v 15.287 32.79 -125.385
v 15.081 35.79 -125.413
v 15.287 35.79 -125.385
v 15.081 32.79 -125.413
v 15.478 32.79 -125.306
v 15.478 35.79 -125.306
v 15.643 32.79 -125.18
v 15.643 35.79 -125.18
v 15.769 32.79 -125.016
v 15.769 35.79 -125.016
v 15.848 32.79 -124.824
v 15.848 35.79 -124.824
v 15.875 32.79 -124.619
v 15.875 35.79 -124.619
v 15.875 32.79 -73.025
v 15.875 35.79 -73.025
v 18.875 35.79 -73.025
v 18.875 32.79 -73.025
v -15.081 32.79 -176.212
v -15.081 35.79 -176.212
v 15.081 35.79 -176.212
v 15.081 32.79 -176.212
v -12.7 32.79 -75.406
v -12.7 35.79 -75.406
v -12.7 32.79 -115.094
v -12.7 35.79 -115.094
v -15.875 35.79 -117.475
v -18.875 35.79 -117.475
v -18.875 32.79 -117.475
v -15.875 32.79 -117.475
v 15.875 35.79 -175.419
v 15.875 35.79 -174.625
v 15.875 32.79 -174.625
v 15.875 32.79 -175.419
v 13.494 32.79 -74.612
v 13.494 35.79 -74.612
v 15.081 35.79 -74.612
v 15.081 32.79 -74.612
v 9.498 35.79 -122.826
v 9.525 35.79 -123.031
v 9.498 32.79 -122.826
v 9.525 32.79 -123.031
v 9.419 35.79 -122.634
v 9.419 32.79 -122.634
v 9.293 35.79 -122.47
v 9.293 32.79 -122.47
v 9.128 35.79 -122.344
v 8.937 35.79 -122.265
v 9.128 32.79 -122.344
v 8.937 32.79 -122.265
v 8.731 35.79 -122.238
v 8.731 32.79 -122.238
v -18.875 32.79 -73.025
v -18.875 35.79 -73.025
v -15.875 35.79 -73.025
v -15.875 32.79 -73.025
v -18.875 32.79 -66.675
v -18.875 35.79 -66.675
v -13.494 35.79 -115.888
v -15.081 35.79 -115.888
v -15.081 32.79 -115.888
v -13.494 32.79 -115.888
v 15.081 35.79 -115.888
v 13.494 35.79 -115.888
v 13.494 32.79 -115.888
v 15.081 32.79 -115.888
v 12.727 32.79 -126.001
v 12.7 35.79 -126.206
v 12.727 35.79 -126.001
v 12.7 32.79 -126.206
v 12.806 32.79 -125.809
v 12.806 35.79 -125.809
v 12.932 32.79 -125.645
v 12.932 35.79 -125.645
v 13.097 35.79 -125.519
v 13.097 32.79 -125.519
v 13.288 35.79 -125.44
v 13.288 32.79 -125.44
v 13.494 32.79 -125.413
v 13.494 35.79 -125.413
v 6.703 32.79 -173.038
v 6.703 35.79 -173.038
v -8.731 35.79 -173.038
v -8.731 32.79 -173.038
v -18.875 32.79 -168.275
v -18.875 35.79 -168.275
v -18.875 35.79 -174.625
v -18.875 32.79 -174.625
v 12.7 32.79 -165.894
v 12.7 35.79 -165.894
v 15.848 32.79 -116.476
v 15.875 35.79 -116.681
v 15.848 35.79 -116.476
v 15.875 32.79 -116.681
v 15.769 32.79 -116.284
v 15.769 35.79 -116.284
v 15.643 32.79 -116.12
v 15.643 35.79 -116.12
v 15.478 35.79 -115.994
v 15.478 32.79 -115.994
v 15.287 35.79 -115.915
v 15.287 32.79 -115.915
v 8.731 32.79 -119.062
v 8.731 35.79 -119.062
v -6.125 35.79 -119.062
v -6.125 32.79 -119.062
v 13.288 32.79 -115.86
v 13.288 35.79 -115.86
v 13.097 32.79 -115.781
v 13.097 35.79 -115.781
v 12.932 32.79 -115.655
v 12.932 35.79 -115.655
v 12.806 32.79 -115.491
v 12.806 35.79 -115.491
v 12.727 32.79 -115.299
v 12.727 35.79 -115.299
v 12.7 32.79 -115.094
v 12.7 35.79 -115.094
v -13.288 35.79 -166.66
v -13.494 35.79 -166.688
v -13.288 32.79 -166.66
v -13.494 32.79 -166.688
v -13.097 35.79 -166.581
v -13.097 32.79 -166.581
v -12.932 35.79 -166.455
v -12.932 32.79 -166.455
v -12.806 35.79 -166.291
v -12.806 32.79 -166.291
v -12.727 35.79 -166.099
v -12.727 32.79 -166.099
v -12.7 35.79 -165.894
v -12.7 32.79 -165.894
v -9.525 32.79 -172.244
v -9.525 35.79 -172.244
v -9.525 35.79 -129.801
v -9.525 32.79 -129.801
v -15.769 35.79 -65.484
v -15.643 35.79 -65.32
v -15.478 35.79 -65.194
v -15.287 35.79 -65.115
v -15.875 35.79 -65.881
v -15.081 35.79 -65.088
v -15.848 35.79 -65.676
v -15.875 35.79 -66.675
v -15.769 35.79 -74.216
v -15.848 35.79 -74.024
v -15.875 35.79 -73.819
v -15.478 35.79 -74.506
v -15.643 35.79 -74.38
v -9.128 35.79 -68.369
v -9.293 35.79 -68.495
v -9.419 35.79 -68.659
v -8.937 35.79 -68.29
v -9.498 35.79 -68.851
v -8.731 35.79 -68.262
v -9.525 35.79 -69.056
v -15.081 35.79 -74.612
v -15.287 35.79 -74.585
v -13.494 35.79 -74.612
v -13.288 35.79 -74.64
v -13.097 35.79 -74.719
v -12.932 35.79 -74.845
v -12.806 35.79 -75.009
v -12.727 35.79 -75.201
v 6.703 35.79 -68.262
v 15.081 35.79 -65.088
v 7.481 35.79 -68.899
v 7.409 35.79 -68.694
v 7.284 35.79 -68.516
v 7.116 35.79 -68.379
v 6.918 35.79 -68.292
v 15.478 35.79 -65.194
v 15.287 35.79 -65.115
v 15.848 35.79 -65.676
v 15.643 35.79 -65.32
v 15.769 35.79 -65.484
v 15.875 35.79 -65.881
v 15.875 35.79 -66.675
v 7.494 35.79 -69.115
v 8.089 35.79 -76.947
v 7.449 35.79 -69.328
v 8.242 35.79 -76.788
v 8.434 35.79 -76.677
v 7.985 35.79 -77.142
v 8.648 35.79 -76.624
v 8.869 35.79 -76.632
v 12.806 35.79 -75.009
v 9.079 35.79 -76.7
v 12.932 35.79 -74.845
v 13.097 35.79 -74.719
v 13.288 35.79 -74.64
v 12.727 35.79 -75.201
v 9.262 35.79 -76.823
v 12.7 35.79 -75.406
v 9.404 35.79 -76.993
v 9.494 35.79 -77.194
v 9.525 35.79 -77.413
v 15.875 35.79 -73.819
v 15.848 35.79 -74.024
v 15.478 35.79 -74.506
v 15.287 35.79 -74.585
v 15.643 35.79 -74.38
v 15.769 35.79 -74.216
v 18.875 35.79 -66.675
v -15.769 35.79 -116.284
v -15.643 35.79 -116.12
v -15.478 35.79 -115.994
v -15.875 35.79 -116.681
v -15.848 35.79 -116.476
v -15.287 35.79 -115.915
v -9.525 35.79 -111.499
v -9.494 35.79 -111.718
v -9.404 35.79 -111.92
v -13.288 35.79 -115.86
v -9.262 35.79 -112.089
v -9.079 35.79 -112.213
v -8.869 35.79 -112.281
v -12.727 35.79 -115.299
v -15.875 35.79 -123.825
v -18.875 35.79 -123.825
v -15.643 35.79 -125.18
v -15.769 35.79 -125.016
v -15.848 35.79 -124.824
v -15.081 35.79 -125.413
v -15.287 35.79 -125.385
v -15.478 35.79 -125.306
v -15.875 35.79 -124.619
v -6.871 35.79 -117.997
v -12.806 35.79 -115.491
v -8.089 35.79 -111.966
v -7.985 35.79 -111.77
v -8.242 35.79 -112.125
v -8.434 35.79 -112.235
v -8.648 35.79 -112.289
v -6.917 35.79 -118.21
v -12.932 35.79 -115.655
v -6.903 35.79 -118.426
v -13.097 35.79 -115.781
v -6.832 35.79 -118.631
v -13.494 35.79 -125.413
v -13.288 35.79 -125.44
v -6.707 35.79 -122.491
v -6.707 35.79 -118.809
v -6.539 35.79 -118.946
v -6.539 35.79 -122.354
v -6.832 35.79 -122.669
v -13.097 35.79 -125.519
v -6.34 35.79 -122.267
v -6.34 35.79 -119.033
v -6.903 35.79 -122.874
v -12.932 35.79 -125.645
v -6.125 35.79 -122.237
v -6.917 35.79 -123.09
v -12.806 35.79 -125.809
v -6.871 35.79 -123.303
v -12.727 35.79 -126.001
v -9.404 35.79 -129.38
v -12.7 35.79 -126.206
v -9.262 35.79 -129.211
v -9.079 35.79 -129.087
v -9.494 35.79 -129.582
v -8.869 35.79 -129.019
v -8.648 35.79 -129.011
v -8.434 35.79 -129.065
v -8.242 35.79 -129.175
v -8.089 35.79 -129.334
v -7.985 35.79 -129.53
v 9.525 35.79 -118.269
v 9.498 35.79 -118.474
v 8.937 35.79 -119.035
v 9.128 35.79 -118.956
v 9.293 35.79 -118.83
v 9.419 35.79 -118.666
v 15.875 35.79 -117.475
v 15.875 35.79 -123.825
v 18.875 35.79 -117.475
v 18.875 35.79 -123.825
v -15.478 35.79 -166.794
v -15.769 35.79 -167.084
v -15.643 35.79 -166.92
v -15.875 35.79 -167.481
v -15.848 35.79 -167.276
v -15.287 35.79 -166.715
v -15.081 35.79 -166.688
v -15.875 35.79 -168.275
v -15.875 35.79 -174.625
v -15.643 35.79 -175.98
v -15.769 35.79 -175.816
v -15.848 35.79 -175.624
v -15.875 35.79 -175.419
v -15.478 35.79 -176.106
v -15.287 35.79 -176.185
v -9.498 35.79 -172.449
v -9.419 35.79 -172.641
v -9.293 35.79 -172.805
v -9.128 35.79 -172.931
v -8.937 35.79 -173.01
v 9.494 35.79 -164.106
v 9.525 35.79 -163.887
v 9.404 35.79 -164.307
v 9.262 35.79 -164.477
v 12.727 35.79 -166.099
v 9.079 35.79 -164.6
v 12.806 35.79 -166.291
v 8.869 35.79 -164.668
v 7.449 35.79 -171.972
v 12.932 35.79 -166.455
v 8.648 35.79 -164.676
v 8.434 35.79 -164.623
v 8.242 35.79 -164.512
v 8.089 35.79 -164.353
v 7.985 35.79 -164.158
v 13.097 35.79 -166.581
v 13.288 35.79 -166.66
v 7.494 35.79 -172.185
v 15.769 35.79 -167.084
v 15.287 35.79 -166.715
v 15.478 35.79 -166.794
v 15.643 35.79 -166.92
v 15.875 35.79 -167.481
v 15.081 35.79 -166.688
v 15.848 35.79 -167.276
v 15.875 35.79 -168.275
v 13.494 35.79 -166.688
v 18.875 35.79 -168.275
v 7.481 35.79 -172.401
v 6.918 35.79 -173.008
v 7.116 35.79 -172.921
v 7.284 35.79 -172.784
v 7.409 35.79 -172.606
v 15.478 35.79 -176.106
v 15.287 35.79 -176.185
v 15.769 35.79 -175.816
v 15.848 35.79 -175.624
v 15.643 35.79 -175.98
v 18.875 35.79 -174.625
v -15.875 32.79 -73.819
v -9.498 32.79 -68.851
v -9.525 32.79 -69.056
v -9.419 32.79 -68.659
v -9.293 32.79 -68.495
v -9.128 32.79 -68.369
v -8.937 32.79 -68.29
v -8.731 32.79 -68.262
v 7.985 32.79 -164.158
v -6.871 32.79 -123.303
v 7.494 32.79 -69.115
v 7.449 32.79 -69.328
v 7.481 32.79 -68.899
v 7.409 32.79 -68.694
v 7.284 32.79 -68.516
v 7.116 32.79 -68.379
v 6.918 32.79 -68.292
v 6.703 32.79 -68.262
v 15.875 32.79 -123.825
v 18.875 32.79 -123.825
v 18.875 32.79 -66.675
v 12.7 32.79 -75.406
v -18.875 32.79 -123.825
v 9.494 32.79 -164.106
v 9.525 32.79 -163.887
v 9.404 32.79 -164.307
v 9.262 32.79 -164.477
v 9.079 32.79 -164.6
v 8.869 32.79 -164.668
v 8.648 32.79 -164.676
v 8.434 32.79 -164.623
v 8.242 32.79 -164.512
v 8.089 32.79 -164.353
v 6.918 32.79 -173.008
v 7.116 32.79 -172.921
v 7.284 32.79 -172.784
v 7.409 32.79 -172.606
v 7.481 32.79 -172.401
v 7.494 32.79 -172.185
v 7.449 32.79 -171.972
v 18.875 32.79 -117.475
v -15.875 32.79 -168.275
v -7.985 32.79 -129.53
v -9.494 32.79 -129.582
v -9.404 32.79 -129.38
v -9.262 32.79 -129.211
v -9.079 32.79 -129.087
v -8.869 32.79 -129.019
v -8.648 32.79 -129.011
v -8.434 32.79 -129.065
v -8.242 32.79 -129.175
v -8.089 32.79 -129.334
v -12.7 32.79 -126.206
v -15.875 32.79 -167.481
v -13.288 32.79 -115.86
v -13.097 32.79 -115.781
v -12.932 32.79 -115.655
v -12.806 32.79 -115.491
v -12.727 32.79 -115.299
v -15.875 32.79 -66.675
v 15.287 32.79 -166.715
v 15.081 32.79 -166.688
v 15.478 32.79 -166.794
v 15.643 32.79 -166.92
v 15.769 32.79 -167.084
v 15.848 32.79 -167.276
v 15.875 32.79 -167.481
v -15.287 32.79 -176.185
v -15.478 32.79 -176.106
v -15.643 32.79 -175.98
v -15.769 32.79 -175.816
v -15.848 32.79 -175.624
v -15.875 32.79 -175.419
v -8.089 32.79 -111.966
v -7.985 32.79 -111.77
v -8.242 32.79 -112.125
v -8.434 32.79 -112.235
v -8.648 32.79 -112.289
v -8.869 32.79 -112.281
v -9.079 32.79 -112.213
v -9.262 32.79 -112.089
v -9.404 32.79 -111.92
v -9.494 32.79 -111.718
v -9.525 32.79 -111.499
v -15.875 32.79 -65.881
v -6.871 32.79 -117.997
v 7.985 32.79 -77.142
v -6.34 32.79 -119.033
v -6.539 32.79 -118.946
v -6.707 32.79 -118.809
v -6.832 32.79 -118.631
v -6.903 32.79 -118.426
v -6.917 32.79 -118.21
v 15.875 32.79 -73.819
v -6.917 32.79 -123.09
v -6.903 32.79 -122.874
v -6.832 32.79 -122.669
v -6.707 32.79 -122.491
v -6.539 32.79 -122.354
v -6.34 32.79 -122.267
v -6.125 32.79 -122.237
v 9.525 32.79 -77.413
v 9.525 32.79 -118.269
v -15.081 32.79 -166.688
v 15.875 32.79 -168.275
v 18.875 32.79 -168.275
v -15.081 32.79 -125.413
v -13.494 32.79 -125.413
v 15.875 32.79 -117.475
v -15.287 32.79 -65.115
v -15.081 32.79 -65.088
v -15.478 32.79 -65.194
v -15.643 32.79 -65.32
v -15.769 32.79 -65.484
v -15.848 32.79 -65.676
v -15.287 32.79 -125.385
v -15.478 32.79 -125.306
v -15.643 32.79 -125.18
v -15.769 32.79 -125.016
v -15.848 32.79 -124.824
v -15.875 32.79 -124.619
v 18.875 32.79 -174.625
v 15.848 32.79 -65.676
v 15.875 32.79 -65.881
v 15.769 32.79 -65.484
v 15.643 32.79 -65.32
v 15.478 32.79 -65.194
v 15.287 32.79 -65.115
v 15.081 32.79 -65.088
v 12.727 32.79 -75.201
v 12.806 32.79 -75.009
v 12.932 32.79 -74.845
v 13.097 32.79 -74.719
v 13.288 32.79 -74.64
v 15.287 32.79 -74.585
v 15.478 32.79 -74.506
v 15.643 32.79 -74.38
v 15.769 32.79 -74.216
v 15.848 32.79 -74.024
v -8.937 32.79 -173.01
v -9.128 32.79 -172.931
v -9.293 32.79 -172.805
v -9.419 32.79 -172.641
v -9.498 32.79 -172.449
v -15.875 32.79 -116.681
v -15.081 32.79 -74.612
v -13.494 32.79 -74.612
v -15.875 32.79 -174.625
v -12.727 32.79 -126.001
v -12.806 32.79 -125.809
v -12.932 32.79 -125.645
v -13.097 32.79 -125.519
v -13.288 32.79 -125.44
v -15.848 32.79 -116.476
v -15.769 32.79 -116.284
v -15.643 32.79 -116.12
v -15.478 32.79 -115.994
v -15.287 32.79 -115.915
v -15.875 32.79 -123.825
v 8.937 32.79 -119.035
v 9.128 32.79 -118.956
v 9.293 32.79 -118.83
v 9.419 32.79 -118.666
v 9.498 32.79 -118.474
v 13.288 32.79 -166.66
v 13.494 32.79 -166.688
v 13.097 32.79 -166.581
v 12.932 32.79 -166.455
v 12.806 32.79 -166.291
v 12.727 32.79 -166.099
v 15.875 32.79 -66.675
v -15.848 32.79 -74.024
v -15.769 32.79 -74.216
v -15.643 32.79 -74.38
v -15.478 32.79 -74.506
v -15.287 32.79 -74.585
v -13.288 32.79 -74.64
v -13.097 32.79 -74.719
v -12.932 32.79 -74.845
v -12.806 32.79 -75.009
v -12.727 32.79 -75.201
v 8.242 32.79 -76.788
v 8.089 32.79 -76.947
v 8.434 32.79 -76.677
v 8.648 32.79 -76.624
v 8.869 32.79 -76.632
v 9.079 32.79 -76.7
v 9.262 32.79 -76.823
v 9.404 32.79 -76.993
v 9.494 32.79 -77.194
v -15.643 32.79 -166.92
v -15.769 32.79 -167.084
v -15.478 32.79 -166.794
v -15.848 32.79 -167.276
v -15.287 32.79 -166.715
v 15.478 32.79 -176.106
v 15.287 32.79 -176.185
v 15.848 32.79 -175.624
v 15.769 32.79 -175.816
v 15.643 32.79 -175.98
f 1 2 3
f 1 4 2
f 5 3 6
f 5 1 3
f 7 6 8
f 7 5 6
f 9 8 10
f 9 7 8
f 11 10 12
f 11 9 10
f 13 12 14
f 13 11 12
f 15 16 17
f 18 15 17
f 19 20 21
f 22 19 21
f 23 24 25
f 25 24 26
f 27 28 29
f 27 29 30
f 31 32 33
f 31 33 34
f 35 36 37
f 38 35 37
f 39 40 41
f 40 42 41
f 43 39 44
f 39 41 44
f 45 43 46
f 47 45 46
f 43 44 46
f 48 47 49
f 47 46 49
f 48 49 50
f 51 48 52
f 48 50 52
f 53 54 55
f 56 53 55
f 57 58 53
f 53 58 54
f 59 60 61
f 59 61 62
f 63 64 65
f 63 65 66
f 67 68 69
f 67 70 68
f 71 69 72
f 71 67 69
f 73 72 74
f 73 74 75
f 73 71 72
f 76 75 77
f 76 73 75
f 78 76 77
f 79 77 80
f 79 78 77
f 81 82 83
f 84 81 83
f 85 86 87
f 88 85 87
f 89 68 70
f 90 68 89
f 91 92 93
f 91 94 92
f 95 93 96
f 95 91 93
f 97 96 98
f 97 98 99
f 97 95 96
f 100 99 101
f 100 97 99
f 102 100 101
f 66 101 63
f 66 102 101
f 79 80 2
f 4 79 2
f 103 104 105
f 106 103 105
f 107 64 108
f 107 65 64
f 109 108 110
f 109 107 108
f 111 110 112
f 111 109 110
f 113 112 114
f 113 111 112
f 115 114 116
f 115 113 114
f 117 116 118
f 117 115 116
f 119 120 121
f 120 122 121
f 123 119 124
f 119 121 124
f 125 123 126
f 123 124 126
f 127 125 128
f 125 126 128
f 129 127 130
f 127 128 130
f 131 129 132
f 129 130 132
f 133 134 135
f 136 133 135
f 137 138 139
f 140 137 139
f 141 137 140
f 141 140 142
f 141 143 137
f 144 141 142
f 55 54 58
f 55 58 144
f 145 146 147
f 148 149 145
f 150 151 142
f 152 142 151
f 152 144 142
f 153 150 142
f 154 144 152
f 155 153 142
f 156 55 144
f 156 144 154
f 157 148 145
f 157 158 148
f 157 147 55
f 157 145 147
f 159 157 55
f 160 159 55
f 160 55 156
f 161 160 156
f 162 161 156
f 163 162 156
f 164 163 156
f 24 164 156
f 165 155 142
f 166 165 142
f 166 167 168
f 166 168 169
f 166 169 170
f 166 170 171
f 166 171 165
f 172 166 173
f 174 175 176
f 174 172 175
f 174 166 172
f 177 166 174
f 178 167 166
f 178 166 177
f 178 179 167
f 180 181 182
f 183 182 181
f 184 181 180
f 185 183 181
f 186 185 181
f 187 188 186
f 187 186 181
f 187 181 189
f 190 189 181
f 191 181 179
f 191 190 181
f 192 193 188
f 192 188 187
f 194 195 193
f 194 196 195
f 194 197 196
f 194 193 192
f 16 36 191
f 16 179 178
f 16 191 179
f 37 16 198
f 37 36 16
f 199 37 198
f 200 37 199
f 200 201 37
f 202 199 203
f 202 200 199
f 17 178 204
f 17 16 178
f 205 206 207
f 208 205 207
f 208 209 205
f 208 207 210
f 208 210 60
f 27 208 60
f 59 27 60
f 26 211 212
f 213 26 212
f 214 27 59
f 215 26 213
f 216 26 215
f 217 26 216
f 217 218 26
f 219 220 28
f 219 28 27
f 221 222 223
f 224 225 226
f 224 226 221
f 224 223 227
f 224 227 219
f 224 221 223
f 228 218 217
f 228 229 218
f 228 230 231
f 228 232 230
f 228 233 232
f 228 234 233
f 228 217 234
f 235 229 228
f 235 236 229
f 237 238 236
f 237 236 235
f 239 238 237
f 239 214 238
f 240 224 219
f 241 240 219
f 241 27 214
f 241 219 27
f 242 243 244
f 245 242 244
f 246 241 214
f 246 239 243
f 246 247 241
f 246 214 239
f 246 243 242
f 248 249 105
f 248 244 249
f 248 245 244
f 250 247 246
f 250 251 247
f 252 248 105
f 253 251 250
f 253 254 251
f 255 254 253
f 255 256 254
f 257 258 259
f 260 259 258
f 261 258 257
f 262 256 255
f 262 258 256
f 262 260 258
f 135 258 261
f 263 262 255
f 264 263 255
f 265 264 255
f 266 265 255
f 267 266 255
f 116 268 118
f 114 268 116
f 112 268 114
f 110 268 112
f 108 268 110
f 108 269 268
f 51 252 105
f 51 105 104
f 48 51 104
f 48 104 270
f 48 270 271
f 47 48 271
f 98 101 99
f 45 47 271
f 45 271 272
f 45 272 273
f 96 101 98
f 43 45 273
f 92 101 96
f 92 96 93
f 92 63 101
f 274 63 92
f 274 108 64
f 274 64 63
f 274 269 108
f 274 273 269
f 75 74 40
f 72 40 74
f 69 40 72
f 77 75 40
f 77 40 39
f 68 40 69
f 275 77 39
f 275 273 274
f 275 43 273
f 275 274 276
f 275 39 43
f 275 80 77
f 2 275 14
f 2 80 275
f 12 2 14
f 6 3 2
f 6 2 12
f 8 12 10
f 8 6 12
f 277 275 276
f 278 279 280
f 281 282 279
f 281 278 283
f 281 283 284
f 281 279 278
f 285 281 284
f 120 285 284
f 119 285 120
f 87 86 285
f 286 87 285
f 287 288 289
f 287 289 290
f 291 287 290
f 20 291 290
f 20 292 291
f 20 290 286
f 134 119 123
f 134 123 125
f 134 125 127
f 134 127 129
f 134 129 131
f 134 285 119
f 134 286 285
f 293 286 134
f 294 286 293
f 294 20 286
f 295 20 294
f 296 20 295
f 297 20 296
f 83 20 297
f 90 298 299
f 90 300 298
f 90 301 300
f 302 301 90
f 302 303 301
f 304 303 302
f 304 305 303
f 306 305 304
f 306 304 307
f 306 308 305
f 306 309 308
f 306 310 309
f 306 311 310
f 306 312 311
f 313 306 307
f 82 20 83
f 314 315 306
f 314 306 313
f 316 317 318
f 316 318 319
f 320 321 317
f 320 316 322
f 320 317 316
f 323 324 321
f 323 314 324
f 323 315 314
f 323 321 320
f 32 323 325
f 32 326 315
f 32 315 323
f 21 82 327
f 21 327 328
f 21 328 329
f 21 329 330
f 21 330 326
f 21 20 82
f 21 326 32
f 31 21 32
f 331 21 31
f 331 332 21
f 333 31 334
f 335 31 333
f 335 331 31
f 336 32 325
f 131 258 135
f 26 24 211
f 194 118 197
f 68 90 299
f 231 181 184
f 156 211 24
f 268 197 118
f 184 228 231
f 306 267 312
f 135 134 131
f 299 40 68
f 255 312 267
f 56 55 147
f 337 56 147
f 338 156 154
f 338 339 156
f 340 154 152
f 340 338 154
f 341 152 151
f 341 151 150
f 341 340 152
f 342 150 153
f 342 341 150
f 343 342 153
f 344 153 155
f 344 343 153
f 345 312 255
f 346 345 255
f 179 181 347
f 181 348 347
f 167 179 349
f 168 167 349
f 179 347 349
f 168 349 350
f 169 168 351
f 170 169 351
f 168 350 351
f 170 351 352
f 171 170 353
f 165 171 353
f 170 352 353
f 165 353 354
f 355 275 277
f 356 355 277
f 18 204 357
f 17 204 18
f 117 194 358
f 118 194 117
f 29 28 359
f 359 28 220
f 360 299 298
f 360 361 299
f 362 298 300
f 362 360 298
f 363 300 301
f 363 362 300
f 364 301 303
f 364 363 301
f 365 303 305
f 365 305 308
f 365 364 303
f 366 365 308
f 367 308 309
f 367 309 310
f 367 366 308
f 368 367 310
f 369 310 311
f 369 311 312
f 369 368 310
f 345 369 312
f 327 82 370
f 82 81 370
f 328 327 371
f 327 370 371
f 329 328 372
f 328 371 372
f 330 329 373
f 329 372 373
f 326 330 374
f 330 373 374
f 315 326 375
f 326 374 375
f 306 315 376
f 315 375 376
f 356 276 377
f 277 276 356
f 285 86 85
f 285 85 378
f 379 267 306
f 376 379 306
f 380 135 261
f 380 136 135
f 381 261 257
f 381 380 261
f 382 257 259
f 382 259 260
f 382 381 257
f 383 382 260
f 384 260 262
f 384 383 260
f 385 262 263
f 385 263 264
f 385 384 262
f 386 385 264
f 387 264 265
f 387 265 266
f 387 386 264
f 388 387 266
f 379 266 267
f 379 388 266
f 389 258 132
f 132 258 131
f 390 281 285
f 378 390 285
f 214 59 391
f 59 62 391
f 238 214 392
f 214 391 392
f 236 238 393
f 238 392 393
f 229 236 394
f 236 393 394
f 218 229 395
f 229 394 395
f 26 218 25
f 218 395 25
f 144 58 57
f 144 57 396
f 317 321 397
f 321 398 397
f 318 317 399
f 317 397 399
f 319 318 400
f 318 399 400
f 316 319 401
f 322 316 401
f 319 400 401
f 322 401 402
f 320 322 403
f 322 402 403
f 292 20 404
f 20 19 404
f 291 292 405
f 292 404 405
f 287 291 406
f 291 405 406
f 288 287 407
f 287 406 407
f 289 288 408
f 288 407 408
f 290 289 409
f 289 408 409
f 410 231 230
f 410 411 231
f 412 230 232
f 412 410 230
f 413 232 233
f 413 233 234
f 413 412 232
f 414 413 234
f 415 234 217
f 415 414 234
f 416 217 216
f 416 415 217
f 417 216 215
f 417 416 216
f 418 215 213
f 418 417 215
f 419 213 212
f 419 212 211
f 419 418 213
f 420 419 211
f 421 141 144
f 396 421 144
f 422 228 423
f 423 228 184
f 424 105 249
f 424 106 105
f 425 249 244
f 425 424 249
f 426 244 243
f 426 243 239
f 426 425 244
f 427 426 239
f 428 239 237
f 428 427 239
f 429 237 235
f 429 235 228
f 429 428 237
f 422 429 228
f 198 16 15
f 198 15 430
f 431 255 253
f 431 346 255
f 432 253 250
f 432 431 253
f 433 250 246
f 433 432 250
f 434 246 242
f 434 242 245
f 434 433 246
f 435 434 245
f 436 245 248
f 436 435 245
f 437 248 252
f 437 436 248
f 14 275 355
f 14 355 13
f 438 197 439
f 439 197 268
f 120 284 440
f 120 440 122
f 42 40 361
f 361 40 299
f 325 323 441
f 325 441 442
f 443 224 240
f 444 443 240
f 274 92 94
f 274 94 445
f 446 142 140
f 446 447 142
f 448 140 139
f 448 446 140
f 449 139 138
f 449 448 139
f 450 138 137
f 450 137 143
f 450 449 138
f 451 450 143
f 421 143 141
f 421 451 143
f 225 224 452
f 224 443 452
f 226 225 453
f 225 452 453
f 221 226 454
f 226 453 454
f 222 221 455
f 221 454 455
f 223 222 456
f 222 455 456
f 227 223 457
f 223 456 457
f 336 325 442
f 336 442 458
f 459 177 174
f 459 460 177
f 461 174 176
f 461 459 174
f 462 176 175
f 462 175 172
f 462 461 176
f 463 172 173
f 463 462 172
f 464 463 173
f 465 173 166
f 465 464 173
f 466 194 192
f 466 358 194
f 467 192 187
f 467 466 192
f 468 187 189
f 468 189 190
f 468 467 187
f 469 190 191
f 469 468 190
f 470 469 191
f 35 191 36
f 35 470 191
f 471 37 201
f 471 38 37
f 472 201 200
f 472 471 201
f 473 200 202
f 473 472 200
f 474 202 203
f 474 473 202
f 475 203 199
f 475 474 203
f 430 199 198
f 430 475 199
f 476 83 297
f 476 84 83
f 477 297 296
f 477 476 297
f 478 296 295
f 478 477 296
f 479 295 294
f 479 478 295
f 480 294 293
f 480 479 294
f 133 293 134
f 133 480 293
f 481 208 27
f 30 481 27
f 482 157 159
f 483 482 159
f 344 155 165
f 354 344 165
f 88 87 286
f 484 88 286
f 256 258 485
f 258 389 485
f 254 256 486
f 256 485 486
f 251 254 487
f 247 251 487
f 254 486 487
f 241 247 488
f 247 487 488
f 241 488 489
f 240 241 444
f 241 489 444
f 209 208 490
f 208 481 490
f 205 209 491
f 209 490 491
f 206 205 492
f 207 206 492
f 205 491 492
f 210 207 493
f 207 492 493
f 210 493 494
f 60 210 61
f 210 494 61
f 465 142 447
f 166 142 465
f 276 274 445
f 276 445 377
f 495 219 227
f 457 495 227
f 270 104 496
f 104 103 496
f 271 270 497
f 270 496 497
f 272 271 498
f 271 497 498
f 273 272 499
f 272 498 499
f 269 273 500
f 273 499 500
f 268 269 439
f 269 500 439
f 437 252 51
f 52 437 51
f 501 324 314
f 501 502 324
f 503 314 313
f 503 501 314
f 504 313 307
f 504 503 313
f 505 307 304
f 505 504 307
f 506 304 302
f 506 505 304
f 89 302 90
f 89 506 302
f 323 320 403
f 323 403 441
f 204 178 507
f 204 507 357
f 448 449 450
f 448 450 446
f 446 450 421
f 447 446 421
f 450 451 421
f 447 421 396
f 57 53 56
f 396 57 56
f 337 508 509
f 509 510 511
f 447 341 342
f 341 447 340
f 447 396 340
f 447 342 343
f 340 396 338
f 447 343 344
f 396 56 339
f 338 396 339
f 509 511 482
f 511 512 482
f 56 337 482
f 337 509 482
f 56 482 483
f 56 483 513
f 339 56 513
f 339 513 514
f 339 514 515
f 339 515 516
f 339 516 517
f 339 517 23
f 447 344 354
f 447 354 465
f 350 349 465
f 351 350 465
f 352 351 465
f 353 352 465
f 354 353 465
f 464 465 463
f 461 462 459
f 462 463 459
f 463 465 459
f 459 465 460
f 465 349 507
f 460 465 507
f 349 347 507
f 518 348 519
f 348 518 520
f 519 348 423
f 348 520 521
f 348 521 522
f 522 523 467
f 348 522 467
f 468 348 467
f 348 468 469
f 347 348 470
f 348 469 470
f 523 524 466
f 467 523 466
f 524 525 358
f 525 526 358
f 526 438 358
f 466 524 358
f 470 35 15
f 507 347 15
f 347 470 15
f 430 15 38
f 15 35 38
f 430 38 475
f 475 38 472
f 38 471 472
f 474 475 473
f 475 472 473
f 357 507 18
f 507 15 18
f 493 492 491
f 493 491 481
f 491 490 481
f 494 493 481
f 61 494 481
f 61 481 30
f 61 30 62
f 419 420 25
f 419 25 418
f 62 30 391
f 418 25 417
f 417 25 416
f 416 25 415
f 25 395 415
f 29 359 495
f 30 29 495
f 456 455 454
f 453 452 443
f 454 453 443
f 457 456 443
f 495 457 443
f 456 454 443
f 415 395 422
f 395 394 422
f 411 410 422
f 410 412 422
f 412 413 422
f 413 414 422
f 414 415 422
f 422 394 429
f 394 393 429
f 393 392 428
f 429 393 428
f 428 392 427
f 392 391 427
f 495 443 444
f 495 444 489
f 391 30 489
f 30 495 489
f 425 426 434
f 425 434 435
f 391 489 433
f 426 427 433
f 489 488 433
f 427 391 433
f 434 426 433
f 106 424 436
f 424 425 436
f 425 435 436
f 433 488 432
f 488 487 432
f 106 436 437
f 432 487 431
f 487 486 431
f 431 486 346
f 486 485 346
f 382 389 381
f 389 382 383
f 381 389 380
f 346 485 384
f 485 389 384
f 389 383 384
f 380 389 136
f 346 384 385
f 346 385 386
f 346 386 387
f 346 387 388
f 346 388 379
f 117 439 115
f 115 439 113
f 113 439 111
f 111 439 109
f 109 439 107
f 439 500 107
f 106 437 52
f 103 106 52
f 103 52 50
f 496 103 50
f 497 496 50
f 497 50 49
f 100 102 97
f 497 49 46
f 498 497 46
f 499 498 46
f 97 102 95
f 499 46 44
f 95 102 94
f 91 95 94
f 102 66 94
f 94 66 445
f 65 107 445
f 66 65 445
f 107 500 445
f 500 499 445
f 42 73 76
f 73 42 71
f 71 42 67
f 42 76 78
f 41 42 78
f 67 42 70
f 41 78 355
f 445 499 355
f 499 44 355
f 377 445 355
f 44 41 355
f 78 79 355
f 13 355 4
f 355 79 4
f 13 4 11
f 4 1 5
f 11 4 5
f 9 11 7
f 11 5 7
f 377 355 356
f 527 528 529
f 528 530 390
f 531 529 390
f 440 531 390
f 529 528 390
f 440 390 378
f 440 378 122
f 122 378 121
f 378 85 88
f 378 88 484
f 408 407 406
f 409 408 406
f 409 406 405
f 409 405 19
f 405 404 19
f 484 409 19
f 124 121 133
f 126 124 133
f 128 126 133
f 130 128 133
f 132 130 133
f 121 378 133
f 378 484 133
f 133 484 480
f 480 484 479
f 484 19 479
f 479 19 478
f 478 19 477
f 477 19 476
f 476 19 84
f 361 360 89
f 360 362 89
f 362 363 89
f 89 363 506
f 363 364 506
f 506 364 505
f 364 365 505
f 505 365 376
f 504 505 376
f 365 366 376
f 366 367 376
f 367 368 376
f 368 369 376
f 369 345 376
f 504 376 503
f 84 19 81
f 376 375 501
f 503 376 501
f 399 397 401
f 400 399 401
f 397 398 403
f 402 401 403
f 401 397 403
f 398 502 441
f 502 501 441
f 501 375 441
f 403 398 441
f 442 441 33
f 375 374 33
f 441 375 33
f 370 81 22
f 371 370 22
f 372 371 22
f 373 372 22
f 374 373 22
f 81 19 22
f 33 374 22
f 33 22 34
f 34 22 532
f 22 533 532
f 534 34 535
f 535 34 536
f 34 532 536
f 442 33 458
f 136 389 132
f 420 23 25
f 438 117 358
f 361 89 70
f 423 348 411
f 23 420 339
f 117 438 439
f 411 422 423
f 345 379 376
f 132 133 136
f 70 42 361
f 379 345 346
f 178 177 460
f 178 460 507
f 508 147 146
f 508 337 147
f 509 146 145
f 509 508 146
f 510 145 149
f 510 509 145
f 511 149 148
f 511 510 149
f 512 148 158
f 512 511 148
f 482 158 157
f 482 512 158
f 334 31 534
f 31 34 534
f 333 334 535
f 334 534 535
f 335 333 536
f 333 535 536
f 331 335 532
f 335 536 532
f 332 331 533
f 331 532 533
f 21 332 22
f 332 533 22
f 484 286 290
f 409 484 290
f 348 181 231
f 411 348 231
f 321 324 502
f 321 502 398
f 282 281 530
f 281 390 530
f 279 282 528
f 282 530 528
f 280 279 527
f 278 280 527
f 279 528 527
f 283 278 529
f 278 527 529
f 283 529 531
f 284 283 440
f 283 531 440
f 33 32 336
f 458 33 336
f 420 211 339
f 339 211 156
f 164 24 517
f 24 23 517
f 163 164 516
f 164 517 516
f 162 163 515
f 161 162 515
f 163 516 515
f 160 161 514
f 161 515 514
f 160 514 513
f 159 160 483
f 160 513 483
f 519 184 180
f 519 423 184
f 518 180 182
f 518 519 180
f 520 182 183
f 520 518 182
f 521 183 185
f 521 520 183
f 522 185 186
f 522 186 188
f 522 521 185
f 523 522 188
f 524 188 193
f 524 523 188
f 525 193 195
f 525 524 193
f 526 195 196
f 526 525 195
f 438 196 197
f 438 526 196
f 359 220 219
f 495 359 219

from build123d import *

# Parameters (mm, degrees)
SKETCH1_W           = 25.4
SKETCH1_H           = 111.125
BOSS_EXTRUDE1_DEPTH = 1.5
SKETCH2_W           = 3.175
SKETCH2_H           = 9.525
BOSS_EXTRUDE2_DEPTH = 3
CUT_EXTRUDE1_DEPTH  = 3
FILLET1_R           = 0.79375
SKETCH5_W           = 3
SKETCH5_H           = 6.35
BOSS_EXTRUDE3_DEPTH = 3


with BuildPart() as part:
    # Sketch1 → Boss-Extrude1 (new, symmetric)
    with BuildSketch(Plane(origin=(0, 34.29, 0), x_dir=(1, 0, 0), z_dir=(0, 1, 0))):
        with Locations((0, 120.65)):
            Rectangle(SKETCH1_W, SKETCH1_H)
    extrude(amount=BOSS_EXTRUDE1_DEPTH, both=True)

    # Sketch2 → Boss-Extrude2 (add)
    with BuildSketch(Plane(origin=(0, 35.79, 0), x_dir=(1, 0, 0), z_dir=(0, 1, 0))):
        with Locations((14.2875, 171.45)):
            Rectangle(SKETCH2_W, SKETCH2_H)
        with Locations((-14.2875, 171.45)):
            Rectangle(SKETCH2_W, SKETCH2_H)
        with Locations((14.2875, 120.65)):
            Rectangle(SKETCH2_W, SKETCH2_H)
        with Locations((-14.2875, 120.65)):
            Rectangle(SKETCH2_W, SKETCH2_H)
        with Locations((14.2875, 69.85)):
            Rectangle(SKETCH2_W, SKETCH2_H)
        with Locations((-14.2875, 69.85)):
            Rectangle(SKETCH2_W, SKETCH2_H)
    extrude(amount=-BOSS_EXTRUDE2_DEPTH)

    # Sketch4 → Cut-Extrude1 (cut)
    with BuildSketch(Plane(origin=(0, 35.79, 0), x_dir=(1, 0, 0), z_dir=(0, 1, 0))):
        Polygon((7.83579899, 173.0375), (-9.525, 173.0375), (-9.525, 125.295302777), align=None)
        Polygon((9.525, 122.2375), (9.525, 168.392197223), (-7.258526263, 122.2375), align=None)
        Polygon((9.525, 119.0625), (-7.258526263, 119.0625), (9.525, 72.907802777), align=None)
        Polygon((7.83579899, 68.2625), (-9.525, 116.004697223), (-9.525, 68.2625), align=None)
    extrude(amount=-CUT_EXTRUDE1_DEPTH, mode=Mode.SUBTRACT)

    # Fillet1
    fillet1_edges = [part.edges().sort_by_distance(p)[0] for p in [
        (-7.258526263, 34.29, -122.2375),
        (9.525, 34.29, -168.392197223),
        (9.525, 34.29, -122.2375),
        (9.525, 34.29, -72.907802777),
        (-7.258526263, 34.29, -119.0625),
        (9.525, 34.29, -119.0625),
        (7.83579899, 34.29, -68.2625),
        (-9.525, 34.29, -68.2625),
        (-9.525, 34.29, -116.004697223),
        (-9.525, 34.29, -125.295302777),
        (-9.525, 34.29, -173.0375),
        (7.83579899, 34.29, -173.0375),
        (15.875, 34.29, -65.0875),
        (15.875, 34.29, -74.6125),
        (12.7, 34.29, -74.6125),
        (-12.7, 34.29, -115.8875),
        (-12.7, 34.29, -125.4125),
        (-15.875, 34.29, -125.4125),
        (-15.875, 34.29, -115.8875),
        (15.875, 34.29, -115.8875),
        (15.875, 34.29, -125.4125),
        (12.7, 34.29, -125.4125),
        (12.7, 34.29, -115.8875),
        (-12.7, 34.29, -166.6875),
        (-15.875, 34.29, -176.2125),
        (-15.875, 34.29, -166.6875),
        (-12.7, 34.29, -74.6125),
        (-15.875, 34.29, -74.6125),
        (-15.875, 34.29, -65.0875),
        (15.875, 34.29, -166.6875),
        (15.875, 34.29, -176.2125),
        (12.7, 34.29, -166.6875),
    ]]
    fillet(fillet1_edges, radius=FILLET1_R)

    # Sketch5 → Boss-Extrude3 (add)
    with BuildSketch(Plane(origin=(0, 35.79, 0), x_dir=(1, 0, 0), z_dir=(0, 1, 0))):
        with Locations((17.375, 171.45)):
            Rectangle(SKETCH5_W, SKETCH5_H)
        with Locations((-17.375, 171.45)):
            Rectangle(SKETCH5_W, SKETCH5_H)
        with Locations((17.375, 120.65)):
            Rectangle(SKETCH5_W, SKETCH5_H)
        with Locations((-17.375, 120.65)):
            Rectangle(SKETCH5_W, SKETCH5_H)
        with Locations((17.375, 69.85)):
            Rectangle(SKETCH5_W, SKETCH5_H)
        with Locations((-17.375, 69.85)):
            Rectangle(SKETCH5_W, SKETCH5_H)
    extrude(amount=-BOSS_EXTRUDE3_DEPTH)


solid = part.part
